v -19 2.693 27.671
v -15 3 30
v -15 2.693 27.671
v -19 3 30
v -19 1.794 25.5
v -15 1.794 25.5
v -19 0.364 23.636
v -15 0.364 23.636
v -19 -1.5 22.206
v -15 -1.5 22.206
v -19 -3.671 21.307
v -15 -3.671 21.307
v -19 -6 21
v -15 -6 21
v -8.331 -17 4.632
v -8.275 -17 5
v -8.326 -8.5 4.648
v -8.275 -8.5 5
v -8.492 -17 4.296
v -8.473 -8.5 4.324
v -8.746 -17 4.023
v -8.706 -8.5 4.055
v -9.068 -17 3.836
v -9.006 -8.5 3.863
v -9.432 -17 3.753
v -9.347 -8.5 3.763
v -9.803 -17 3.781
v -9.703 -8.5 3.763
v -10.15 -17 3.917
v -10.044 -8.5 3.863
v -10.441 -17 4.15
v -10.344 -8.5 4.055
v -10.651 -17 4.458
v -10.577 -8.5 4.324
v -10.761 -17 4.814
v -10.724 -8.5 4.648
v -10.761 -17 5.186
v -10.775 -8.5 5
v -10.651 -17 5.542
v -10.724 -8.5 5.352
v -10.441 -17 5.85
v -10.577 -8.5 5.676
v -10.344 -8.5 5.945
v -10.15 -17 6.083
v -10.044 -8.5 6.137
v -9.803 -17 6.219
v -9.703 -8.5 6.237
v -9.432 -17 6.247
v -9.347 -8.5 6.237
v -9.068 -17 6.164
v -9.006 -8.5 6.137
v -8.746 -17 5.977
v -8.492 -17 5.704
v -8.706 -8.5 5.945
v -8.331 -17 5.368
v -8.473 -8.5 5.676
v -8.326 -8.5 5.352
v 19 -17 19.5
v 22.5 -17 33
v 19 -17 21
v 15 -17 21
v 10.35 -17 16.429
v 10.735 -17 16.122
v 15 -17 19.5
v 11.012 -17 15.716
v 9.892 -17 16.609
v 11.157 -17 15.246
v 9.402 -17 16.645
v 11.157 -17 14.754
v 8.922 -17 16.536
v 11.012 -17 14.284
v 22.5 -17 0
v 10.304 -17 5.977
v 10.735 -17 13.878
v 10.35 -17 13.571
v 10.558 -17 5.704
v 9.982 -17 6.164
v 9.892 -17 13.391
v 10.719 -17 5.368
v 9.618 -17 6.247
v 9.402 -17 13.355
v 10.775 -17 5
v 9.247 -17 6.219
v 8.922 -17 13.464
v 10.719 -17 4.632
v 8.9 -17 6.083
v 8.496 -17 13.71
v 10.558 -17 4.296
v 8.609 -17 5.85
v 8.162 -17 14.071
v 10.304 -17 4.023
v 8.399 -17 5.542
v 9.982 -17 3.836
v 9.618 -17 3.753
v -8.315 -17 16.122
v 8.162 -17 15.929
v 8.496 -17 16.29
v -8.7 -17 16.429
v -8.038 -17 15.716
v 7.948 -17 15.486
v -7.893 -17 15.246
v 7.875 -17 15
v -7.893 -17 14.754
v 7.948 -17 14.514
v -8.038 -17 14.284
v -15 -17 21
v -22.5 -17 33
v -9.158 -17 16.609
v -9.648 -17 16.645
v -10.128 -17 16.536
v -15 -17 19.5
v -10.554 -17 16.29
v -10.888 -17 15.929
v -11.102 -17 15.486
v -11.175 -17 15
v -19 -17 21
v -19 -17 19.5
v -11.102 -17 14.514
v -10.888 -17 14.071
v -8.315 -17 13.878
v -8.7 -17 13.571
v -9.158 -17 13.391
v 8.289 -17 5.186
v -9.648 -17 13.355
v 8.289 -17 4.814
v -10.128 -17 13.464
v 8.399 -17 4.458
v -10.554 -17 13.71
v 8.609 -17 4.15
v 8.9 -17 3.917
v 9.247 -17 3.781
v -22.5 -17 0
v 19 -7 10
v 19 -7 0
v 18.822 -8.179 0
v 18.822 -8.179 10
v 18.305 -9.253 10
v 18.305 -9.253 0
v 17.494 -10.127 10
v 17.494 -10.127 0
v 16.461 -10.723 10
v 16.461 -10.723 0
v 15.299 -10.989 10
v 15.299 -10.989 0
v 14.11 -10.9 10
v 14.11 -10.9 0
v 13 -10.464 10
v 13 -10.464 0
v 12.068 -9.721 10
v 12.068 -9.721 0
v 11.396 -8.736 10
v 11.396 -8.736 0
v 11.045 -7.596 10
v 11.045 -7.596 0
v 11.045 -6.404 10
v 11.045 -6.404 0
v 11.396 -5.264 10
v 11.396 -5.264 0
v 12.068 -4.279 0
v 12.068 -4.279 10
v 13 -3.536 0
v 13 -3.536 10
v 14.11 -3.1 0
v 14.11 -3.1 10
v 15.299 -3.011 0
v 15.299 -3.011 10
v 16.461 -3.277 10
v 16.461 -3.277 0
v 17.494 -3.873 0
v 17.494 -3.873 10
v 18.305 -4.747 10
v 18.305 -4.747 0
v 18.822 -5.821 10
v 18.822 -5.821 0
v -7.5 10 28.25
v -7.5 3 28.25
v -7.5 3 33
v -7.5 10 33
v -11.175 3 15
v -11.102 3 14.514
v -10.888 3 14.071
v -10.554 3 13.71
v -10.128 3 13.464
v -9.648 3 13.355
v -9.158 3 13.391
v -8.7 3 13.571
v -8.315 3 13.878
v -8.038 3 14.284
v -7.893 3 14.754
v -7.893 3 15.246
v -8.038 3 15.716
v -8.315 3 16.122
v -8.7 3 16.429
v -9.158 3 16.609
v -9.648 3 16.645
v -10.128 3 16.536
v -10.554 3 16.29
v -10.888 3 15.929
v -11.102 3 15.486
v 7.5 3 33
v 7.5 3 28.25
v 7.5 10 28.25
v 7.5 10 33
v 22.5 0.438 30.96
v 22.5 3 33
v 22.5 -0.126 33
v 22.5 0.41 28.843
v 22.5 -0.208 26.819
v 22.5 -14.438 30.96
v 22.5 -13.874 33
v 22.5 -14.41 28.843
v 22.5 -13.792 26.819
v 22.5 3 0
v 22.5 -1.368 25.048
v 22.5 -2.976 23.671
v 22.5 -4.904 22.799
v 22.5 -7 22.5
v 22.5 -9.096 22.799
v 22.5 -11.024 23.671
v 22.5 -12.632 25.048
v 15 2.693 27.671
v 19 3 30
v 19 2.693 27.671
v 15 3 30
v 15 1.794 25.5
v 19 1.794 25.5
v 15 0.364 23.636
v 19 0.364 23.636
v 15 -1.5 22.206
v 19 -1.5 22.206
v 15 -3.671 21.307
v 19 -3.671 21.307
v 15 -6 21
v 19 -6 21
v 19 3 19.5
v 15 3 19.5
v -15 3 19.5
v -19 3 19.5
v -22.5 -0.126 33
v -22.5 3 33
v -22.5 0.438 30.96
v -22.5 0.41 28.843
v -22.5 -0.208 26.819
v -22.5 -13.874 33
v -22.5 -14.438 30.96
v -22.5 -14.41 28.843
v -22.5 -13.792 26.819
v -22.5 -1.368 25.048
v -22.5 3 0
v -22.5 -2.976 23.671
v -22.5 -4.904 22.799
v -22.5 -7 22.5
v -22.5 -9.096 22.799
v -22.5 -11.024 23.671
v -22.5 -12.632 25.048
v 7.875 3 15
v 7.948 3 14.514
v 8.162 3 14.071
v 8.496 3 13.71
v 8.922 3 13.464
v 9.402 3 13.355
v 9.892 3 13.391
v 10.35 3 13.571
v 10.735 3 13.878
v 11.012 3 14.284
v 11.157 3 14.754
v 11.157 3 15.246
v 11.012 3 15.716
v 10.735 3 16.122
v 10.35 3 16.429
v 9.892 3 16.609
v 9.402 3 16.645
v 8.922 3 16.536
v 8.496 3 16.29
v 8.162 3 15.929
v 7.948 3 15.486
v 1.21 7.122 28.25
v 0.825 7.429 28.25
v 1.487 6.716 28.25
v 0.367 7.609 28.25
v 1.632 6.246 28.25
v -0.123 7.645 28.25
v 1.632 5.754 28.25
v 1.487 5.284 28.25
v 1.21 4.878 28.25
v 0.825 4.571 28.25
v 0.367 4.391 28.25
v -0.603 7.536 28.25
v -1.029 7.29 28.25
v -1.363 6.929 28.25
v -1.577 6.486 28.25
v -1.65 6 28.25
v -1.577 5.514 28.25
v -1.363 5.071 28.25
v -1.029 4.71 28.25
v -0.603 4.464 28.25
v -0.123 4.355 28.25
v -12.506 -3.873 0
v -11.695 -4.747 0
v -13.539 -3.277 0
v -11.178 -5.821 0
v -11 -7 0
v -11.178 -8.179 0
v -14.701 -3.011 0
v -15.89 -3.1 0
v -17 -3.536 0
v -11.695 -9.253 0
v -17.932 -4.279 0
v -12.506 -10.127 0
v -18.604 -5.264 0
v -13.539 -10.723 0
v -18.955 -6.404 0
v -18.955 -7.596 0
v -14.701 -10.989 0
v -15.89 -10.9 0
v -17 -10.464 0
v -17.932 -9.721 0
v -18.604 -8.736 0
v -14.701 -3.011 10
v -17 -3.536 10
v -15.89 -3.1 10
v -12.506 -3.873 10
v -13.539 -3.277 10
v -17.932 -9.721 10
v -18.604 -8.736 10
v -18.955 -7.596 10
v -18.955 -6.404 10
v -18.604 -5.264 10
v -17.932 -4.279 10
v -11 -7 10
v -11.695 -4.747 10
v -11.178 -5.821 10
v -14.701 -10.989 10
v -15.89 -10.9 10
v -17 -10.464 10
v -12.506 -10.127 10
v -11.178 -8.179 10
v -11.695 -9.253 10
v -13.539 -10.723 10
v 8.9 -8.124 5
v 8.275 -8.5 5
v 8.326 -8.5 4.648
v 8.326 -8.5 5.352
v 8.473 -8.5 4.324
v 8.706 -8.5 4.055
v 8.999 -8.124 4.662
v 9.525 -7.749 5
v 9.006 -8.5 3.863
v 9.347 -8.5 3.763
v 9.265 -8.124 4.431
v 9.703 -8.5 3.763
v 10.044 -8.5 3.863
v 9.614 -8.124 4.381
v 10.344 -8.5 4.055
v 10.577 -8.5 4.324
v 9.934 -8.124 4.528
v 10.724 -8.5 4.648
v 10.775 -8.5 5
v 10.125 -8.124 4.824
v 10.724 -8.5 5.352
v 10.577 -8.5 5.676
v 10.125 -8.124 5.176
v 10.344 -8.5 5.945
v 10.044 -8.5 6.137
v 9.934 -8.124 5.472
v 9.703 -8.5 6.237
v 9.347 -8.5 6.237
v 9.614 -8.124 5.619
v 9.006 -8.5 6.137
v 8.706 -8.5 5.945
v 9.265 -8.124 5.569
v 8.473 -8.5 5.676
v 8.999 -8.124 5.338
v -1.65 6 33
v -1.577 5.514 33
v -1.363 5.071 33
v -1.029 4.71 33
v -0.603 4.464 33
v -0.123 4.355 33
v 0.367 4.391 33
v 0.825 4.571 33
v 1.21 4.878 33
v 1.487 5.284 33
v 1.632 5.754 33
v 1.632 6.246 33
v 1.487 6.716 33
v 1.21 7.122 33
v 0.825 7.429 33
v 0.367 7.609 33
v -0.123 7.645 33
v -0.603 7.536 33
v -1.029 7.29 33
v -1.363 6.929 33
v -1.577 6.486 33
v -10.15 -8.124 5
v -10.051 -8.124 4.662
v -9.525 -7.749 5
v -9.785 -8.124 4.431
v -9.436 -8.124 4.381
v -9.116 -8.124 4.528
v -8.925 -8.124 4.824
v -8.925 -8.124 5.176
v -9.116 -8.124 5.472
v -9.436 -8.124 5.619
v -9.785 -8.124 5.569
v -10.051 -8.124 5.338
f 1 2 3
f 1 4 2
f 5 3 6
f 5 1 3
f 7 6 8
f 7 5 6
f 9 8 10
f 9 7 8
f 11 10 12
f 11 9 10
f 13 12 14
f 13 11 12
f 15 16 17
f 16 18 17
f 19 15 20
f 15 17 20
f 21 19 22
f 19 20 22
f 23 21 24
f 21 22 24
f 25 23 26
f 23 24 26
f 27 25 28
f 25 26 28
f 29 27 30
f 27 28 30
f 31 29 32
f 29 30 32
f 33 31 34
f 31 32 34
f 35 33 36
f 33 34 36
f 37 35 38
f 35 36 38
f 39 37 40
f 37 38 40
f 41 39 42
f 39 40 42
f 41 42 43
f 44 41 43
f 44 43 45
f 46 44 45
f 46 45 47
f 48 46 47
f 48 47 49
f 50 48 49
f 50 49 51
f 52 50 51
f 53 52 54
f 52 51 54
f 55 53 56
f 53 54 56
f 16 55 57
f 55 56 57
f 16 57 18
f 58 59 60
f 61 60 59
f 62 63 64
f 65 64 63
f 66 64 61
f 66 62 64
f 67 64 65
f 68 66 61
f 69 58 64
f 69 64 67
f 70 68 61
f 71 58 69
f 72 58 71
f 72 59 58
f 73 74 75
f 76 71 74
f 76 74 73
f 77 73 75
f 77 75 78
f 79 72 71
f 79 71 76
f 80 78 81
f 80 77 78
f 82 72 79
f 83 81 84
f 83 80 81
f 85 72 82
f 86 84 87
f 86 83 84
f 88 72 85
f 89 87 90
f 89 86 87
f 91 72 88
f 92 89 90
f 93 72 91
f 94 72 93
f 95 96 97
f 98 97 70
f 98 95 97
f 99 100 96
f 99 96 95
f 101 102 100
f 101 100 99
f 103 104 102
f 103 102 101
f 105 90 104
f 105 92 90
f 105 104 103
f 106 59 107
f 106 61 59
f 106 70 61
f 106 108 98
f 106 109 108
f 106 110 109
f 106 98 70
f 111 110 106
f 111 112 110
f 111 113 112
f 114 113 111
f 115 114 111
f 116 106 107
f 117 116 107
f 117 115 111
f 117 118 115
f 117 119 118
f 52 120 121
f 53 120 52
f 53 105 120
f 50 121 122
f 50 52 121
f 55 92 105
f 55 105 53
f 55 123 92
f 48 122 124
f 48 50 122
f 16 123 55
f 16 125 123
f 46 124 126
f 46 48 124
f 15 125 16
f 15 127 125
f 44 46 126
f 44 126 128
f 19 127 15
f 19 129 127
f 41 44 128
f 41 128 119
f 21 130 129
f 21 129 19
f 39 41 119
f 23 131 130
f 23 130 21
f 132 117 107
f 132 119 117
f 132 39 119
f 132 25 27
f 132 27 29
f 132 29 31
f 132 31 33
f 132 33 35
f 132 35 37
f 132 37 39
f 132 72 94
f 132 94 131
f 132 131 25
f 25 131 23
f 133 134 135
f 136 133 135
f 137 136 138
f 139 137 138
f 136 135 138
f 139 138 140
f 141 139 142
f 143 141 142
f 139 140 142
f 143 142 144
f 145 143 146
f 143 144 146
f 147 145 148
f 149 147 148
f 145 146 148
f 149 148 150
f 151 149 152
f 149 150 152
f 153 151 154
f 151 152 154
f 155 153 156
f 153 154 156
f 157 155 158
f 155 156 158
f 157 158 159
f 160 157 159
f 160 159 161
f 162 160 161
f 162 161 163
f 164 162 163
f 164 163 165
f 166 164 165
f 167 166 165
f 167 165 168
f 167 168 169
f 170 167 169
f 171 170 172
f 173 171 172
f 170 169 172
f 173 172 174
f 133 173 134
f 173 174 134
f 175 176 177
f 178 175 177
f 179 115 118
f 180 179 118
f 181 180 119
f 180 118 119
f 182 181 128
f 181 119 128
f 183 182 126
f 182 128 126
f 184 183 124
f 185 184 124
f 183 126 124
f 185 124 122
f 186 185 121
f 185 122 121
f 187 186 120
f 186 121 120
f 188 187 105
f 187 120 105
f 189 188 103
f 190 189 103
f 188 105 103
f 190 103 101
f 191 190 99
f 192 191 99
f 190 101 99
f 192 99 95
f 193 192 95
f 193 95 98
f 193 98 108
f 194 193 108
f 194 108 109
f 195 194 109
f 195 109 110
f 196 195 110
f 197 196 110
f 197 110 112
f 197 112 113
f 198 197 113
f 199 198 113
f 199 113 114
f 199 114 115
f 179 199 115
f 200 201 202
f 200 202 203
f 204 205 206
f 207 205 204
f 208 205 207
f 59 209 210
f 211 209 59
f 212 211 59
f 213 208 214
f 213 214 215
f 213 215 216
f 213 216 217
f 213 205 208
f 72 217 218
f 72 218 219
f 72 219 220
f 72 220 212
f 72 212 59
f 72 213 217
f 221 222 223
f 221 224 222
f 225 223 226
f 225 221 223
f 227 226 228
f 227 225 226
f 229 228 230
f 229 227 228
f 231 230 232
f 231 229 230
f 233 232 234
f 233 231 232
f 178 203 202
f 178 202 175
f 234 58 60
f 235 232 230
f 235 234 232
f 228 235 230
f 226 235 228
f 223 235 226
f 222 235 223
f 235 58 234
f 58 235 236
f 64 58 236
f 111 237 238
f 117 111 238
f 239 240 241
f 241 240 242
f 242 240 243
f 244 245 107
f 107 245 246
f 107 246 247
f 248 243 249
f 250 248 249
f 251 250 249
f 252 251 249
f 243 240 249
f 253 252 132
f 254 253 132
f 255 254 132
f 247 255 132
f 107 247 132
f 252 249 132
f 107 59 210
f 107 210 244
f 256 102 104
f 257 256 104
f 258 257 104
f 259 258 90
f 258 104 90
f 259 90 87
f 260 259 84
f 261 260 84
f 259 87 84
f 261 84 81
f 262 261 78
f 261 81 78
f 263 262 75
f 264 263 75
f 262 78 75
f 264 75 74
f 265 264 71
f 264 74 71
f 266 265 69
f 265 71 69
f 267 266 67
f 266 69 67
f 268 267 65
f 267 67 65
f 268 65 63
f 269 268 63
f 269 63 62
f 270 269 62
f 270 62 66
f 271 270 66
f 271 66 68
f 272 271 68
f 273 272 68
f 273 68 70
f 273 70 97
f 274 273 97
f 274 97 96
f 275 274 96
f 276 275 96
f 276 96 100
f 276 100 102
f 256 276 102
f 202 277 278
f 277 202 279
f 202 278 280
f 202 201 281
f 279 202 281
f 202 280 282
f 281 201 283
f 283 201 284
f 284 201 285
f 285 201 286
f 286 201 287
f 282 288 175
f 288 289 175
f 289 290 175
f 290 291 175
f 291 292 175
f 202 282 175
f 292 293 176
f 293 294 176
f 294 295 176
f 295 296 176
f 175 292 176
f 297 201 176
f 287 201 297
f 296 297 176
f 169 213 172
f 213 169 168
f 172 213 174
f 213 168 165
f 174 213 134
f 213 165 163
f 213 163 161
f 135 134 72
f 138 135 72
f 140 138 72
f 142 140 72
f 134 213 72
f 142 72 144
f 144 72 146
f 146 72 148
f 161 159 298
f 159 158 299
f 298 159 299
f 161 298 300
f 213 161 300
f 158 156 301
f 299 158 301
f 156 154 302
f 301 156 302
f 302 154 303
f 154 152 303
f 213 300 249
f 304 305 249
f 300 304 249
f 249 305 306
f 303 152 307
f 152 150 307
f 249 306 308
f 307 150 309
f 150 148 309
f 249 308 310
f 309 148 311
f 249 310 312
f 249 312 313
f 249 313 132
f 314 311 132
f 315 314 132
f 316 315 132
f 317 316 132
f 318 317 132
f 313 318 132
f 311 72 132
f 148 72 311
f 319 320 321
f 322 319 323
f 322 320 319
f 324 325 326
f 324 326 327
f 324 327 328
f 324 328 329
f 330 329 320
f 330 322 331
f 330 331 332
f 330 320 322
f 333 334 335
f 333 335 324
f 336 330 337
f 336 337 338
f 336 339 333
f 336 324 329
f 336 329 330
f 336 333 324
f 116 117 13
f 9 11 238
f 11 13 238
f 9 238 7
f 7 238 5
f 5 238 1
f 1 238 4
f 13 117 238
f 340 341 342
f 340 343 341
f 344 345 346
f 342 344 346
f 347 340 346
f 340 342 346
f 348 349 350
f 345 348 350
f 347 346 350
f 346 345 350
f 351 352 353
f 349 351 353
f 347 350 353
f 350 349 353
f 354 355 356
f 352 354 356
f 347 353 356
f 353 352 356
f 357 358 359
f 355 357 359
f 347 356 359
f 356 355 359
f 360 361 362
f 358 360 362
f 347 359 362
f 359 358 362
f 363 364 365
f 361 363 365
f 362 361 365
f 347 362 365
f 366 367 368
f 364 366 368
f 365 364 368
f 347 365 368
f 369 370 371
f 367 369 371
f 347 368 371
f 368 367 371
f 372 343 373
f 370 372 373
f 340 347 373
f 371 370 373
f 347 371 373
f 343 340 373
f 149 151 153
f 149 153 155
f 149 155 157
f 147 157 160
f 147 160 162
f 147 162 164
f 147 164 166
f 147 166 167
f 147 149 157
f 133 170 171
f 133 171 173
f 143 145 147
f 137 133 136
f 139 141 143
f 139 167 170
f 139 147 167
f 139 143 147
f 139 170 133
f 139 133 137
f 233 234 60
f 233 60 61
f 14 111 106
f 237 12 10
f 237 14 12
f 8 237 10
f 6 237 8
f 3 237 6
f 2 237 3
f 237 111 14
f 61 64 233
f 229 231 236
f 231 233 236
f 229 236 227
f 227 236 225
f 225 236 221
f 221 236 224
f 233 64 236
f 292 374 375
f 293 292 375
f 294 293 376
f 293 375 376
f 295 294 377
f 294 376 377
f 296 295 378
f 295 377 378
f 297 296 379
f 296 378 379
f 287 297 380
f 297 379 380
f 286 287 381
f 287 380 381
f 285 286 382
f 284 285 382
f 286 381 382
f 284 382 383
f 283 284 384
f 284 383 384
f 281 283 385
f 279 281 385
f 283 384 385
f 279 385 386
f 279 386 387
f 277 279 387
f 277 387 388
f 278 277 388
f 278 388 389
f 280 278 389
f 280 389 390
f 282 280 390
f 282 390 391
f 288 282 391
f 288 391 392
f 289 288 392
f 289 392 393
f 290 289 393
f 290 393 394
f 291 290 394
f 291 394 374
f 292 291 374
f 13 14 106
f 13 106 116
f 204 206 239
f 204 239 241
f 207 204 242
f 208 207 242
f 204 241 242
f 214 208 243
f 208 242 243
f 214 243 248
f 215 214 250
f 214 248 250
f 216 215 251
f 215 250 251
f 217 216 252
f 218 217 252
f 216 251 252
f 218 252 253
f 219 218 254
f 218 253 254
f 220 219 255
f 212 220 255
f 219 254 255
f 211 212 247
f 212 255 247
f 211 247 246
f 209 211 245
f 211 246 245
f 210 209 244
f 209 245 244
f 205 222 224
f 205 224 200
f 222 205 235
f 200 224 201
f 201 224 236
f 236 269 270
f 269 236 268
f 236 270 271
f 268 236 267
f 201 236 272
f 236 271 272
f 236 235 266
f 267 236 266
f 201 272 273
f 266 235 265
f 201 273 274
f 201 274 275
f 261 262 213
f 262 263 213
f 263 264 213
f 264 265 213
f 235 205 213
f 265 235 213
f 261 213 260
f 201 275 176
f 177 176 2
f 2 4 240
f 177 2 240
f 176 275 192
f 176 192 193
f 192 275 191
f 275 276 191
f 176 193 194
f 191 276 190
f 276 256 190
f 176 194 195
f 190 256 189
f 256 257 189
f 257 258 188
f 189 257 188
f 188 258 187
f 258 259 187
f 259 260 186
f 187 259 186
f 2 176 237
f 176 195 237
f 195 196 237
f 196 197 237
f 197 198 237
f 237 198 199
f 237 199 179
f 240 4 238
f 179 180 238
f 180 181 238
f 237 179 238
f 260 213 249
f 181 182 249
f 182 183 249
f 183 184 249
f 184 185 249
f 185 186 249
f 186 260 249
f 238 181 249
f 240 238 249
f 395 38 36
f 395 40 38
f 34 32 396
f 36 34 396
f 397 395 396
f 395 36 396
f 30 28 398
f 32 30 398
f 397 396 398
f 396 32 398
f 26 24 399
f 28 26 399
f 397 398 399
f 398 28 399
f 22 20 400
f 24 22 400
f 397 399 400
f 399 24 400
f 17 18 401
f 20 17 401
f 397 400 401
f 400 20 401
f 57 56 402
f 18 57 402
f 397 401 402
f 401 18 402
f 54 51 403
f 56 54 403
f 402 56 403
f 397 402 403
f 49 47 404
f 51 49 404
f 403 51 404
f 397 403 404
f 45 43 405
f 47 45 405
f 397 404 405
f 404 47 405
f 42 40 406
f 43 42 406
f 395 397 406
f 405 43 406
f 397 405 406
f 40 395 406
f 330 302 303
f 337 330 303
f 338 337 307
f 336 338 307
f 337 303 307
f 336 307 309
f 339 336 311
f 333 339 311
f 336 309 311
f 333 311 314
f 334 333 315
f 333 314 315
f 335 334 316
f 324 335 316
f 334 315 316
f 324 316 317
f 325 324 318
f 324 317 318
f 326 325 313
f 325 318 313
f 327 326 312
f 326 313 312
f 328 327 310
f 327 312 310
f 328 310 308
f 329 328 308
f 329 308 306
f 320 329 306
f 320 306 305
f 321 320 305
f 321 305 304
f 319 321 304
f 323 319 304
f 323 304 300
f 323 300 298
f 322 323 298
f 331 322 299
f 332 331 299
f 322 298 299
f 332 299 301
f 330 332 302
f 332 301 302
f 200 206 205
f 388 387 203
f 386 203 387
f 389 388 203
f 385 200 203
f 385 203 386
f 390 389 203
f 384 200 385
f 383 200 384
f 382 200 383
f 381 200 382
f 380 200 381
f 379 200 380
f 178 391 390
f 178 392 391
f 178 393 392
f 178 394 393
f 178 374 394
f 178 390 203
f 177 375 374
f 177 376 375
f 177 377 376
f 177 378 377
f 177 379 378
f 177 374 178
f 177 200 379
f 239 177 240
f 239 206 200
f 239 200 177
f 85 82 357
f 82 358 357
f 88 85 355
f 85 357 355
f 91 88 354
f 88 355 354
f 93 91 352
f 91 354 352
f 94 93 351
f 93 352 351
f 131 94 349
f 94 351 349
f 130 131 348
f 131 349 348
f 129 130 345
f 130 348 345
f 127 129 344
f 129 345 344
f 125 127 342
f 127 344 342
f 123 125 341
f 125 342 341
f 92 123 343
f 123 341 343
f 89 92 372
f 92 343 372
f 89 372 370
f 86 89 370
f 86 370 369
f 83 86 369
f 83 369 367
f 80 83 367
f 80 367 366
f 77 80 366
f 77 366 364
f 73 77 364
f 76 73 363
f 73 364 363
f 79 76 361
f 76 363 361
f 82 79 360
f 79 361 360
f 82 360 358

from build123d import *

# Parameters (mm, degrees)
SKETCH2_W                 = 45
SKETCH2_H                 = 20
BOSS_EXTRUDE1_DEPTH       = 33
M4X0_7_TAPPED_HOLE1_D     = 3.3
SKETCH3_R                 = 7.5
CUT_EXTRUDE1_DEPTH        = 45
SKETCH4_R                 = 4
CUT_EXTRUDE2_DEPTH        = 10
M3X0_5_TAPPED_HOLE1_D     = 2.5
M3X0_5_TAPPED_HOLE1_DEPTH = 8.5
M3X0_5_TAPPED_HOLE1_TIP   = 0.751075774
SKETCH5_W                 = 4
SKETCH5_H                 = 1.5
CUT_EXTRUDE3_DEPTH        = 39
FILLET1_R                 = 9
SKETCH8_W                 = 15
SKETCH8_H                 = 4.75
BOSS_EXTRUDE2_DEPTH       = 7
M4X0_7_TAPPED_HOLE3_D     = 3.3
BODY_MOVE_COPY1_ANGLE     = 180


with BuildPart() as part:
    # Sketch2 → Boss-Extrude1 (new body)
    with BuildSketch(Plane.XY):
        Rectangle(SKETCH2_W, SKETCH2_H)
    extrude(amount=BOSS_EXTRUDE1_DEPTH)

    # M4x0.7 Tapped Hole1 (through all)
    with Locations(Plane(origin=(0, -10, 0), x_dir=(-1, 0, 0), z_dir=(0, -1, 0))):
        with Locations((-9.525, -15), (9.525, -15)):
            Hole(M4X0_7_TAPPED_HOLE1_D / 2)

    # Sketch3 → Cut-Extrude1 (cut)
    with BuildSketch(Plane(origin=(22.5, 0, 0), x_dir=(0, 0, -1), z_dir=(1, 0, 0))):
        with Locations((-30, 0)):
            Circle(SKETCH3_R)
    extrude(amount=-CUT_EXTRUDE1_DEPTH, mode=Mode.SUBTRACT)

    # Sketch4 → Cut-Extrude2 (cut)
    with BuildSketch(Plane(origin=(0, 0, 0), x_dir=(-1, 0, 0), z_dir=(0, 0, -1))):
        with Locations((-15, 0)):
            Circle(SKETCH4_R)
        with Locations((15, 0)):
            Circle(SKETCH4_R)
    extrude(amount=-CUT_EXTRUDE2_DEPTH, mode=Mode.SUBTRACT)

    # M3x0.5 Tapped Hole1
    with Locations(Plane(origin=(0, 10, 0), x_dir=(1, 0, 0), z_dir=(0, 1, 0))):
        with Locations((9.525, -5), (-9.525, -5)):
            Hole(M3X0_5_TAPPED_HOLE1_D / 2, depth=M3X0_5_TAPPED_HOLE1_DEPTH)
            with Locations((0, 0, -(M3X0_5_TAPPED_HOLE1_DEPTH + M3X0_5_TAPPED_HOLE1_TIP / 2))):  # 118° drill point
                Cone(0, M3X0_5_TAPPED_HOLE1_D / 2, M3X0_5_TAPPED_HOLE1_TIP, mode=Mode.SUBTRACT)

    # Sketch5 → Cut-Extrude3 (cut)
    with BuildSketch(Plane.XZ.offset(10)):
        with Locations((-17, 20.25)):
            Rectangle(SKETCH5_W, SKETCH5_H)
        with Locations((17, 20.25)):
            Rectangle(SKETCH5_W, SKETCH5_H)
    extrude(amount=-CUT_EXTRUDE3_DEPTH, mode=Mode.SUBTRACT)

    # Fillet1
    fillet1_edges = [part.edges().sort_by_distance(p)[0] for p in [
        (-17, -10, 21),
        (17, -10, 21),
    ]]
    fillet(fillet1_edges, radius=FILLET1_R)

    # Sketch8 → Boss-Extrude2 (add)
    with BuildSketch(Plane.XZ.offset(10)):
        with Locations((0, 30.625)):
            Rectangle(SKETCH8_W, SKETCH8_H)
    extrude(amount=BOSS_EXTRUDE2_DEPTH)

    # M4x0.7 Tapped Hole3 (through all)
    with Locations(Plane(origin=(0, 0, 28.25), x_dir=(-1, 0, 0), z_dir=(0, 0, -1))):
        with Locations((0, -13)):
            Hole(M4X0_7_TAPPED_HOLE3_D / 2)


with BuildPart() as part_1:
    # Body-Move/Copy1: moved
    add(part.part.rotate(Axis((0, -3.5, 0), (0, 0, 1)), BODY_MOVE_COPY1_ANGLE))


solid = part_1.part
